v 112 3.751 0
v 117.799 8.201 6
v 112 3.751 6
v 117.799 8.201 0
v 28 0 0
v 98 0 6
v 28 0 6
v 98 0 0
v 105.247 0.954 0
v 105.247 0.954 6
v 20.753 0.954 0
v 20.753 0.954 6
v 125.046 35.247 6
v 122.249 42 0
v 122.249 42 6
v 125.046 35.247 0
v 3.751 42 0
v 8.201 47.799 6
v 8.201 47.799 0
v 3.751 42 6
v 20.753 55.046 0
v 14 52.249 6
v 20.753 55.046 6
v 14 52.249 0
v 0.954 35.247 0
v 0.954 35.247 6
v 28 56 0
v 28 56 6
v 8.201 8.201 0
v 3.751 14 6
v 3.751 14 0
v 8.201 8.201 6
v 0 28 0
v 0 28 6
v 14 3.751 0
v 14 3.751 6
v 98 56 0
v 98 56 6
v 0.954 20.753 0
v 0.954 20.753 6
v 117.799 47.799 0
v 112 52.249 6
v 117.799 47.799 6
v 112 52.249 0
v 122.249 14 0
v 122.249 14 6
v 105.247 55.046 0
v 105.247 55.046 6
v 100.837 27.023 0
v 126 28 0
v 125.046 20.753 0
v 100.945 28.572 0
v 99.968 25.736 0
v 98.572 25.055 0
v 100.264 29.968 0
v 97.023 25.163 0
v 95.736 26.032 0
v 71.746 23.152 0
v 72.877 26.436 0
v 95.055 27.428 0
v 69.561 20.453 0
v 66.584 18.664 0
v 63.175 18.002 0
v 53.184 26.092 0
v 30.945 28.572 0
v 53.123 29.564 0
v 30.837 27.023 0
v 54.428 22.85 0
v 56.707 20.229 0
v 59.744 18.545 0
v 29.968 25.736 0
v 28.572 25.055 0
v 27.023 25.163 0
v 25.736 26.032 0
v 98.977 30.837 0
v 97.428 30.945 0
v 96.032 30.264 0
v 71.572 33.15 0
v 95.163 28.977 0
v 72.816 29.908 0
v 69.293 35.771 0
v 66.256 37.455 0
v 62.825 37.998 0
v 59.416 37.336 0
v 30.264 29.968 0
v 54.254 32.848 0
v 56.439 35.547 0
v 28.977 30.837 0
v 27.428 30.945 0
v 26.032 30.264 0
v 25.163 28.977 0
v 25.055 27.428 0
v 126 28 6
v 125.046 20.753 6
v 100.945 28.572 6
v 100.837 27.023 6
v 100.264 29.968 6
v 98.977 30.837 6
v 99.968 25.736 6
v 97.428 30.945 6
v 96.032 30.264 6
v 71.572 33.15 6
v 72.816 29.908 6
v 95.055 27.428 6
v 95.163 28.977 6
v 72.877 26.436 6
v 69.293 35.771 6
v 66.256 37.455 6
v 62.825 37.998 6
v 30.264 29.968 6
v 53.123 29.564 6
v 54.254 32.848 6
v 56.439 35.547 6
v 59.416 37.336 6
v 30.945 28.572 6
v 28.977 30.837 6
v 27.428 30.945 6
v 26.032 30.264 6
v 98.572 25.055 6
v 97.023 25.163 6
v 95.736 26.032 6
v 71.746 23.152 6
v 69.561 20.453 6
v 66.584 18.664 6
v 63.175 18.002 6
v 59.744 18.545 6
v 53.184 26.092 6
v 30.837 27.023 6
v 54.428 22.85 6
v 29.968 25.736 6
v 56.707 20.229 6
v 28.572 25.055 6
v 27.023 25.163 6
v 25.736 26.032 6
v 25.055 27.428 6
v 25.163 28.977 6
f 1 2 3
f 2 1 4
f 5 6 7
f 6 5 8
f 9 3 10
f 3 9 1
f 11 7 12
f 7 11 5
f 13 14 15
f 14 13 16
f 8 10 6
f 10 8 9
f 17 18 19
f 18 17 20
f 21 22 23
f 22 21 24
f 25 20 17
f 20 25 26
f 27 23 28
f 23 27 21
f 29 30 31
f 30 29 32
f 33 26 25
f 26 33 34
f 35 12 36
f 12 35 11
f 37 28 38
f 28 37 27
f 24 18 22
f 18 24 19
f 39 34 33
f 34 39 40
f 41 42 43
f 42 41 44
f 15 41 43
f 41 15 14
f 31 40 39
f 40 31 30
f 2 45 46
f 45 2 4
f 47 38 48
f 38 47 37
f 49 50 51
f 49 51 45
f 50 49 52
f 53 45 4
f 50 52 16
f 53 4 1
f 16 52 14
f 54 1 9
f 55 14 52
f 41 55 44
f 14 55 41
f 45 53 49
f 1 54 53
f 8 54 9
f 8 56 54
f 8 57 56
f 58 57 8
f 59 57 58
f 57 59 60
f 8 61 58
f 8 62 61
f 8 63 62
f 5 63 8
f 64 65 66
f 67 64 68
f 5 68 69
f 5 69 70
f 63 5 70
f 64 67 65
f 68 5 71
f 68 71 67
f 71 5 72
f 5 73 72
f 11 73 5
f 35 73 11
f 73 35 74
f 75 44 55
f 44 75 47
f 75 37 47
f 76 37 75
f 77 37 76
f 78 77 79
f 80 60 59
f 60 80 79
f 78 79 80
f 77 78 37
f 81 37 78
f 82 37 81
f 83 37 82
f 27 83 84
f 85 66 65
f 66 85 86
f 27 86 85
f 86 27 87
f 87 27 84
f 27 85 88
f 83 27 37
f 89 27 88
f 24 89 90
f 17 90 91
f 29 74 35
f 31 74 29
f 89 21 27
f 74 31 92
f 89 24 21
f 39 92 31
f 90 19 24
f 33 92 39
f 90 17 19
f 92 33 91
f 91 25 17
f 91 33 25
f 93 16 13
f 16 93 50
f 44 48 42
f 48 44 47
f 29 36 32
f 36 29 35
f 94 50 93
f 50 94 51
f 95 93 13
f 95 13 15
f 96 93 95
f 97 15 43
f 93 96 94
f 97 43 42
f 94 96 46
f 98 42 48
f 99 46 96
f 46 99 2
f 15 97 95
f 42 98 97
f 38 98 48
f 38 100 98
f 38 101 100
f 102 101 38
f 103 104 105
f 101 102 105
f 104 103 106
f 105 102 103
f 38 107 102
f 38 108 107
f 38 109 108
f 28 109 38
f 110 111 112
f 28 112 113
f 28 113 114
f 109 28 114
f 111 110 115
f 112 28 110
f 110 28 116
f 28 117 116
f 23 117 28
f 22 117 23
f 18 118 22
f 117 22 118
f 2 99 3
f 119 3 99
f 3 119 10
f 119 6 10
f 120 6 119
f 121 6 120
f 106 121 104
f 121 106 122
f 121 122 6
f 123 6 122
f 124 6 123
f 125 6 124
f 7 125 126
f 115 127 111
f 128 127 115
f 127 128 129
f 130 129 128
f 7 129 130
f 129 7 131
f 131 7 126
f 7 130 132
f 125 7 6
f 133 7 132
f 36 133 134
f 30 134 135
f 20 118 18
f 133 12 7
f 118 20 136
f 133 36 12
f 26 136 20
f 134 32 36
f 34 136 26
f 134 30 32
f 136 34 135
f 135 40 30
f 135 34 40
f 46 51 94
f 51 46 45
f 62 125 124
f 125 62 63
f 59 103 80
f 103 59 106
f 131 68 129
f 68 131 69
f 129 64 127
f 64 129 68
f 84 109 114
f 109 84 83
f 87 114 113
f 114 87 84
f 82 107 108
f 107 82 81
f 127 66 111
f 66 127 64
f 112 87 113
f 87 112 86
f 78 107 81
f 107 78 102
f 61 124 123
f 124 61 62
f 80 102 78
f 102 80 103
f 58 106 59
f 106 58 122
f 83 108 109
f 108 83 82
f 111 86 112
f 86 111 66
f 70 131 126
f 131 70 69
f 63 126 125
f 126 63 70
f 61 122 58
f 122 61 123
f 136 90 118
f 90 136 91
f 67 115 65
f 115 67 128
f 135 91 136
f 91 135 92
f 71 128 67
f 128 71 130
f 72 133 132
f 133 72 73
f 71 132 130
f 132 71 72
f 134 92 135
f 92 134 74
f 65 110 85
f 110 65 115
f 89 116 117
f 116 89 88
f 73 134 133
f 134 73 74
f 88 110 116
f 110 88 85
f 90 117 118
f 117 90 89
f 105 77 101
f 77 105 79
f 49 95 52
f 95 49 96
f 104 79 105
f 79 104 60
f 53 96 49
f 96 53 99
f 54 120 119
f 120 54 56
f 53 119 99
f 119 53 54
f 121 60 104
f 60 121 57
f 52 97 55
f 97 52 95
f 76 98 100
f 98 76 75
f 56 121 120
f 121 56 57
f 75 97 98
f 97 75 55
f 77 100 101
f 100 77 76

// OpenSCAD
$fn = 32;

// ----------------------------------------------------------------------
// Spacer plate: obround span 70, caps R28
// ----------------------------------------------------------------------

// --- parameters (mm) ---
bore_r = 10;              // centre bore radius
bolt_r = 3;               // bolt hole radius
plate_t = 6;              // plate thickness, Z (extrusion height)
span = 70;                // obround span
cap_r = 28;               // cap radius

profile = [[28, 56], [20.753, 55.046], [14, 52.249], [8.201, 47.799], [3.751, 42], [0.954, 35.247], [0, 28], [0.954, 20.753], [3.751, 14], [8.201, 8.201], [14, 3.751], [20.753, 0.954], [28, 0], [98, 0], [105.247, 0.954], [112, 3.751], [117.799, 8.201], [122.249, 14], [125.046, 20.753], [126, 28], [125.046, 35.247], [122.249, 42], [117.799, 47.799], [112, 52.249], [105.247, 55.046], [98, 56]];  // primary outline, 26 points, counter clockwise
void_1 = [[72.816, 29.908], [71.572, 33.15], [69.293, 35.771], [66.256, 37.455], [62.825, 37.998], [59.416, 37.336], [56.439, 35.547], [54.254, 32.848], [53.123, 29.564], [53.184, 26.092], [54.428, 22.85], [56.707, 20.229], [59.744, 18.545], [63.175, 18.002], [66.584, 18.664], [69.561, 20.453], [71.746, 23.152], [72.877, 26.436]];  // centre bore, 18 points
void_2 = [[30.945, 28.572], [30.264, 29.968], [28.977, 30.837], [27.428, 30.945], [26.032, 30.264], [25.163, 28.977], [25.055, 27.428], [25.736, 26.032], [27.023, 25.163], [28.572, 25.055], [29.968, 25.736], [30.837, 27.023]];  // end hole, 12 points
void_3 = [[100.945, 28.572], [100.264, 29.968], [98.977, 30.837], [97.428, 30.945], [96.032, 30.264], [95.163, 28.977], [95.055, 27.428], [95.736, 26.032], [97.023, 25.163], [98.572, 25.055], [99.968, 25.736], [100.837, 27.023]];  // end hole, 12 points

// --- the one profile operation ---
difference() {
  linear_extrude(height = plate_t) polygon(points = profile);
  translate([0, 0, -1])
    linear_extrude(height = plate_t + 2) polygon(points = void_1);
  translate([0, 0, -1])
    linear_extrude(height = plate_t + 2) polygon(points = void_2);
  translate([0, 0, -1])
    linear_extrude(height = plate_t + 2) polygon(points = void_3);
}
